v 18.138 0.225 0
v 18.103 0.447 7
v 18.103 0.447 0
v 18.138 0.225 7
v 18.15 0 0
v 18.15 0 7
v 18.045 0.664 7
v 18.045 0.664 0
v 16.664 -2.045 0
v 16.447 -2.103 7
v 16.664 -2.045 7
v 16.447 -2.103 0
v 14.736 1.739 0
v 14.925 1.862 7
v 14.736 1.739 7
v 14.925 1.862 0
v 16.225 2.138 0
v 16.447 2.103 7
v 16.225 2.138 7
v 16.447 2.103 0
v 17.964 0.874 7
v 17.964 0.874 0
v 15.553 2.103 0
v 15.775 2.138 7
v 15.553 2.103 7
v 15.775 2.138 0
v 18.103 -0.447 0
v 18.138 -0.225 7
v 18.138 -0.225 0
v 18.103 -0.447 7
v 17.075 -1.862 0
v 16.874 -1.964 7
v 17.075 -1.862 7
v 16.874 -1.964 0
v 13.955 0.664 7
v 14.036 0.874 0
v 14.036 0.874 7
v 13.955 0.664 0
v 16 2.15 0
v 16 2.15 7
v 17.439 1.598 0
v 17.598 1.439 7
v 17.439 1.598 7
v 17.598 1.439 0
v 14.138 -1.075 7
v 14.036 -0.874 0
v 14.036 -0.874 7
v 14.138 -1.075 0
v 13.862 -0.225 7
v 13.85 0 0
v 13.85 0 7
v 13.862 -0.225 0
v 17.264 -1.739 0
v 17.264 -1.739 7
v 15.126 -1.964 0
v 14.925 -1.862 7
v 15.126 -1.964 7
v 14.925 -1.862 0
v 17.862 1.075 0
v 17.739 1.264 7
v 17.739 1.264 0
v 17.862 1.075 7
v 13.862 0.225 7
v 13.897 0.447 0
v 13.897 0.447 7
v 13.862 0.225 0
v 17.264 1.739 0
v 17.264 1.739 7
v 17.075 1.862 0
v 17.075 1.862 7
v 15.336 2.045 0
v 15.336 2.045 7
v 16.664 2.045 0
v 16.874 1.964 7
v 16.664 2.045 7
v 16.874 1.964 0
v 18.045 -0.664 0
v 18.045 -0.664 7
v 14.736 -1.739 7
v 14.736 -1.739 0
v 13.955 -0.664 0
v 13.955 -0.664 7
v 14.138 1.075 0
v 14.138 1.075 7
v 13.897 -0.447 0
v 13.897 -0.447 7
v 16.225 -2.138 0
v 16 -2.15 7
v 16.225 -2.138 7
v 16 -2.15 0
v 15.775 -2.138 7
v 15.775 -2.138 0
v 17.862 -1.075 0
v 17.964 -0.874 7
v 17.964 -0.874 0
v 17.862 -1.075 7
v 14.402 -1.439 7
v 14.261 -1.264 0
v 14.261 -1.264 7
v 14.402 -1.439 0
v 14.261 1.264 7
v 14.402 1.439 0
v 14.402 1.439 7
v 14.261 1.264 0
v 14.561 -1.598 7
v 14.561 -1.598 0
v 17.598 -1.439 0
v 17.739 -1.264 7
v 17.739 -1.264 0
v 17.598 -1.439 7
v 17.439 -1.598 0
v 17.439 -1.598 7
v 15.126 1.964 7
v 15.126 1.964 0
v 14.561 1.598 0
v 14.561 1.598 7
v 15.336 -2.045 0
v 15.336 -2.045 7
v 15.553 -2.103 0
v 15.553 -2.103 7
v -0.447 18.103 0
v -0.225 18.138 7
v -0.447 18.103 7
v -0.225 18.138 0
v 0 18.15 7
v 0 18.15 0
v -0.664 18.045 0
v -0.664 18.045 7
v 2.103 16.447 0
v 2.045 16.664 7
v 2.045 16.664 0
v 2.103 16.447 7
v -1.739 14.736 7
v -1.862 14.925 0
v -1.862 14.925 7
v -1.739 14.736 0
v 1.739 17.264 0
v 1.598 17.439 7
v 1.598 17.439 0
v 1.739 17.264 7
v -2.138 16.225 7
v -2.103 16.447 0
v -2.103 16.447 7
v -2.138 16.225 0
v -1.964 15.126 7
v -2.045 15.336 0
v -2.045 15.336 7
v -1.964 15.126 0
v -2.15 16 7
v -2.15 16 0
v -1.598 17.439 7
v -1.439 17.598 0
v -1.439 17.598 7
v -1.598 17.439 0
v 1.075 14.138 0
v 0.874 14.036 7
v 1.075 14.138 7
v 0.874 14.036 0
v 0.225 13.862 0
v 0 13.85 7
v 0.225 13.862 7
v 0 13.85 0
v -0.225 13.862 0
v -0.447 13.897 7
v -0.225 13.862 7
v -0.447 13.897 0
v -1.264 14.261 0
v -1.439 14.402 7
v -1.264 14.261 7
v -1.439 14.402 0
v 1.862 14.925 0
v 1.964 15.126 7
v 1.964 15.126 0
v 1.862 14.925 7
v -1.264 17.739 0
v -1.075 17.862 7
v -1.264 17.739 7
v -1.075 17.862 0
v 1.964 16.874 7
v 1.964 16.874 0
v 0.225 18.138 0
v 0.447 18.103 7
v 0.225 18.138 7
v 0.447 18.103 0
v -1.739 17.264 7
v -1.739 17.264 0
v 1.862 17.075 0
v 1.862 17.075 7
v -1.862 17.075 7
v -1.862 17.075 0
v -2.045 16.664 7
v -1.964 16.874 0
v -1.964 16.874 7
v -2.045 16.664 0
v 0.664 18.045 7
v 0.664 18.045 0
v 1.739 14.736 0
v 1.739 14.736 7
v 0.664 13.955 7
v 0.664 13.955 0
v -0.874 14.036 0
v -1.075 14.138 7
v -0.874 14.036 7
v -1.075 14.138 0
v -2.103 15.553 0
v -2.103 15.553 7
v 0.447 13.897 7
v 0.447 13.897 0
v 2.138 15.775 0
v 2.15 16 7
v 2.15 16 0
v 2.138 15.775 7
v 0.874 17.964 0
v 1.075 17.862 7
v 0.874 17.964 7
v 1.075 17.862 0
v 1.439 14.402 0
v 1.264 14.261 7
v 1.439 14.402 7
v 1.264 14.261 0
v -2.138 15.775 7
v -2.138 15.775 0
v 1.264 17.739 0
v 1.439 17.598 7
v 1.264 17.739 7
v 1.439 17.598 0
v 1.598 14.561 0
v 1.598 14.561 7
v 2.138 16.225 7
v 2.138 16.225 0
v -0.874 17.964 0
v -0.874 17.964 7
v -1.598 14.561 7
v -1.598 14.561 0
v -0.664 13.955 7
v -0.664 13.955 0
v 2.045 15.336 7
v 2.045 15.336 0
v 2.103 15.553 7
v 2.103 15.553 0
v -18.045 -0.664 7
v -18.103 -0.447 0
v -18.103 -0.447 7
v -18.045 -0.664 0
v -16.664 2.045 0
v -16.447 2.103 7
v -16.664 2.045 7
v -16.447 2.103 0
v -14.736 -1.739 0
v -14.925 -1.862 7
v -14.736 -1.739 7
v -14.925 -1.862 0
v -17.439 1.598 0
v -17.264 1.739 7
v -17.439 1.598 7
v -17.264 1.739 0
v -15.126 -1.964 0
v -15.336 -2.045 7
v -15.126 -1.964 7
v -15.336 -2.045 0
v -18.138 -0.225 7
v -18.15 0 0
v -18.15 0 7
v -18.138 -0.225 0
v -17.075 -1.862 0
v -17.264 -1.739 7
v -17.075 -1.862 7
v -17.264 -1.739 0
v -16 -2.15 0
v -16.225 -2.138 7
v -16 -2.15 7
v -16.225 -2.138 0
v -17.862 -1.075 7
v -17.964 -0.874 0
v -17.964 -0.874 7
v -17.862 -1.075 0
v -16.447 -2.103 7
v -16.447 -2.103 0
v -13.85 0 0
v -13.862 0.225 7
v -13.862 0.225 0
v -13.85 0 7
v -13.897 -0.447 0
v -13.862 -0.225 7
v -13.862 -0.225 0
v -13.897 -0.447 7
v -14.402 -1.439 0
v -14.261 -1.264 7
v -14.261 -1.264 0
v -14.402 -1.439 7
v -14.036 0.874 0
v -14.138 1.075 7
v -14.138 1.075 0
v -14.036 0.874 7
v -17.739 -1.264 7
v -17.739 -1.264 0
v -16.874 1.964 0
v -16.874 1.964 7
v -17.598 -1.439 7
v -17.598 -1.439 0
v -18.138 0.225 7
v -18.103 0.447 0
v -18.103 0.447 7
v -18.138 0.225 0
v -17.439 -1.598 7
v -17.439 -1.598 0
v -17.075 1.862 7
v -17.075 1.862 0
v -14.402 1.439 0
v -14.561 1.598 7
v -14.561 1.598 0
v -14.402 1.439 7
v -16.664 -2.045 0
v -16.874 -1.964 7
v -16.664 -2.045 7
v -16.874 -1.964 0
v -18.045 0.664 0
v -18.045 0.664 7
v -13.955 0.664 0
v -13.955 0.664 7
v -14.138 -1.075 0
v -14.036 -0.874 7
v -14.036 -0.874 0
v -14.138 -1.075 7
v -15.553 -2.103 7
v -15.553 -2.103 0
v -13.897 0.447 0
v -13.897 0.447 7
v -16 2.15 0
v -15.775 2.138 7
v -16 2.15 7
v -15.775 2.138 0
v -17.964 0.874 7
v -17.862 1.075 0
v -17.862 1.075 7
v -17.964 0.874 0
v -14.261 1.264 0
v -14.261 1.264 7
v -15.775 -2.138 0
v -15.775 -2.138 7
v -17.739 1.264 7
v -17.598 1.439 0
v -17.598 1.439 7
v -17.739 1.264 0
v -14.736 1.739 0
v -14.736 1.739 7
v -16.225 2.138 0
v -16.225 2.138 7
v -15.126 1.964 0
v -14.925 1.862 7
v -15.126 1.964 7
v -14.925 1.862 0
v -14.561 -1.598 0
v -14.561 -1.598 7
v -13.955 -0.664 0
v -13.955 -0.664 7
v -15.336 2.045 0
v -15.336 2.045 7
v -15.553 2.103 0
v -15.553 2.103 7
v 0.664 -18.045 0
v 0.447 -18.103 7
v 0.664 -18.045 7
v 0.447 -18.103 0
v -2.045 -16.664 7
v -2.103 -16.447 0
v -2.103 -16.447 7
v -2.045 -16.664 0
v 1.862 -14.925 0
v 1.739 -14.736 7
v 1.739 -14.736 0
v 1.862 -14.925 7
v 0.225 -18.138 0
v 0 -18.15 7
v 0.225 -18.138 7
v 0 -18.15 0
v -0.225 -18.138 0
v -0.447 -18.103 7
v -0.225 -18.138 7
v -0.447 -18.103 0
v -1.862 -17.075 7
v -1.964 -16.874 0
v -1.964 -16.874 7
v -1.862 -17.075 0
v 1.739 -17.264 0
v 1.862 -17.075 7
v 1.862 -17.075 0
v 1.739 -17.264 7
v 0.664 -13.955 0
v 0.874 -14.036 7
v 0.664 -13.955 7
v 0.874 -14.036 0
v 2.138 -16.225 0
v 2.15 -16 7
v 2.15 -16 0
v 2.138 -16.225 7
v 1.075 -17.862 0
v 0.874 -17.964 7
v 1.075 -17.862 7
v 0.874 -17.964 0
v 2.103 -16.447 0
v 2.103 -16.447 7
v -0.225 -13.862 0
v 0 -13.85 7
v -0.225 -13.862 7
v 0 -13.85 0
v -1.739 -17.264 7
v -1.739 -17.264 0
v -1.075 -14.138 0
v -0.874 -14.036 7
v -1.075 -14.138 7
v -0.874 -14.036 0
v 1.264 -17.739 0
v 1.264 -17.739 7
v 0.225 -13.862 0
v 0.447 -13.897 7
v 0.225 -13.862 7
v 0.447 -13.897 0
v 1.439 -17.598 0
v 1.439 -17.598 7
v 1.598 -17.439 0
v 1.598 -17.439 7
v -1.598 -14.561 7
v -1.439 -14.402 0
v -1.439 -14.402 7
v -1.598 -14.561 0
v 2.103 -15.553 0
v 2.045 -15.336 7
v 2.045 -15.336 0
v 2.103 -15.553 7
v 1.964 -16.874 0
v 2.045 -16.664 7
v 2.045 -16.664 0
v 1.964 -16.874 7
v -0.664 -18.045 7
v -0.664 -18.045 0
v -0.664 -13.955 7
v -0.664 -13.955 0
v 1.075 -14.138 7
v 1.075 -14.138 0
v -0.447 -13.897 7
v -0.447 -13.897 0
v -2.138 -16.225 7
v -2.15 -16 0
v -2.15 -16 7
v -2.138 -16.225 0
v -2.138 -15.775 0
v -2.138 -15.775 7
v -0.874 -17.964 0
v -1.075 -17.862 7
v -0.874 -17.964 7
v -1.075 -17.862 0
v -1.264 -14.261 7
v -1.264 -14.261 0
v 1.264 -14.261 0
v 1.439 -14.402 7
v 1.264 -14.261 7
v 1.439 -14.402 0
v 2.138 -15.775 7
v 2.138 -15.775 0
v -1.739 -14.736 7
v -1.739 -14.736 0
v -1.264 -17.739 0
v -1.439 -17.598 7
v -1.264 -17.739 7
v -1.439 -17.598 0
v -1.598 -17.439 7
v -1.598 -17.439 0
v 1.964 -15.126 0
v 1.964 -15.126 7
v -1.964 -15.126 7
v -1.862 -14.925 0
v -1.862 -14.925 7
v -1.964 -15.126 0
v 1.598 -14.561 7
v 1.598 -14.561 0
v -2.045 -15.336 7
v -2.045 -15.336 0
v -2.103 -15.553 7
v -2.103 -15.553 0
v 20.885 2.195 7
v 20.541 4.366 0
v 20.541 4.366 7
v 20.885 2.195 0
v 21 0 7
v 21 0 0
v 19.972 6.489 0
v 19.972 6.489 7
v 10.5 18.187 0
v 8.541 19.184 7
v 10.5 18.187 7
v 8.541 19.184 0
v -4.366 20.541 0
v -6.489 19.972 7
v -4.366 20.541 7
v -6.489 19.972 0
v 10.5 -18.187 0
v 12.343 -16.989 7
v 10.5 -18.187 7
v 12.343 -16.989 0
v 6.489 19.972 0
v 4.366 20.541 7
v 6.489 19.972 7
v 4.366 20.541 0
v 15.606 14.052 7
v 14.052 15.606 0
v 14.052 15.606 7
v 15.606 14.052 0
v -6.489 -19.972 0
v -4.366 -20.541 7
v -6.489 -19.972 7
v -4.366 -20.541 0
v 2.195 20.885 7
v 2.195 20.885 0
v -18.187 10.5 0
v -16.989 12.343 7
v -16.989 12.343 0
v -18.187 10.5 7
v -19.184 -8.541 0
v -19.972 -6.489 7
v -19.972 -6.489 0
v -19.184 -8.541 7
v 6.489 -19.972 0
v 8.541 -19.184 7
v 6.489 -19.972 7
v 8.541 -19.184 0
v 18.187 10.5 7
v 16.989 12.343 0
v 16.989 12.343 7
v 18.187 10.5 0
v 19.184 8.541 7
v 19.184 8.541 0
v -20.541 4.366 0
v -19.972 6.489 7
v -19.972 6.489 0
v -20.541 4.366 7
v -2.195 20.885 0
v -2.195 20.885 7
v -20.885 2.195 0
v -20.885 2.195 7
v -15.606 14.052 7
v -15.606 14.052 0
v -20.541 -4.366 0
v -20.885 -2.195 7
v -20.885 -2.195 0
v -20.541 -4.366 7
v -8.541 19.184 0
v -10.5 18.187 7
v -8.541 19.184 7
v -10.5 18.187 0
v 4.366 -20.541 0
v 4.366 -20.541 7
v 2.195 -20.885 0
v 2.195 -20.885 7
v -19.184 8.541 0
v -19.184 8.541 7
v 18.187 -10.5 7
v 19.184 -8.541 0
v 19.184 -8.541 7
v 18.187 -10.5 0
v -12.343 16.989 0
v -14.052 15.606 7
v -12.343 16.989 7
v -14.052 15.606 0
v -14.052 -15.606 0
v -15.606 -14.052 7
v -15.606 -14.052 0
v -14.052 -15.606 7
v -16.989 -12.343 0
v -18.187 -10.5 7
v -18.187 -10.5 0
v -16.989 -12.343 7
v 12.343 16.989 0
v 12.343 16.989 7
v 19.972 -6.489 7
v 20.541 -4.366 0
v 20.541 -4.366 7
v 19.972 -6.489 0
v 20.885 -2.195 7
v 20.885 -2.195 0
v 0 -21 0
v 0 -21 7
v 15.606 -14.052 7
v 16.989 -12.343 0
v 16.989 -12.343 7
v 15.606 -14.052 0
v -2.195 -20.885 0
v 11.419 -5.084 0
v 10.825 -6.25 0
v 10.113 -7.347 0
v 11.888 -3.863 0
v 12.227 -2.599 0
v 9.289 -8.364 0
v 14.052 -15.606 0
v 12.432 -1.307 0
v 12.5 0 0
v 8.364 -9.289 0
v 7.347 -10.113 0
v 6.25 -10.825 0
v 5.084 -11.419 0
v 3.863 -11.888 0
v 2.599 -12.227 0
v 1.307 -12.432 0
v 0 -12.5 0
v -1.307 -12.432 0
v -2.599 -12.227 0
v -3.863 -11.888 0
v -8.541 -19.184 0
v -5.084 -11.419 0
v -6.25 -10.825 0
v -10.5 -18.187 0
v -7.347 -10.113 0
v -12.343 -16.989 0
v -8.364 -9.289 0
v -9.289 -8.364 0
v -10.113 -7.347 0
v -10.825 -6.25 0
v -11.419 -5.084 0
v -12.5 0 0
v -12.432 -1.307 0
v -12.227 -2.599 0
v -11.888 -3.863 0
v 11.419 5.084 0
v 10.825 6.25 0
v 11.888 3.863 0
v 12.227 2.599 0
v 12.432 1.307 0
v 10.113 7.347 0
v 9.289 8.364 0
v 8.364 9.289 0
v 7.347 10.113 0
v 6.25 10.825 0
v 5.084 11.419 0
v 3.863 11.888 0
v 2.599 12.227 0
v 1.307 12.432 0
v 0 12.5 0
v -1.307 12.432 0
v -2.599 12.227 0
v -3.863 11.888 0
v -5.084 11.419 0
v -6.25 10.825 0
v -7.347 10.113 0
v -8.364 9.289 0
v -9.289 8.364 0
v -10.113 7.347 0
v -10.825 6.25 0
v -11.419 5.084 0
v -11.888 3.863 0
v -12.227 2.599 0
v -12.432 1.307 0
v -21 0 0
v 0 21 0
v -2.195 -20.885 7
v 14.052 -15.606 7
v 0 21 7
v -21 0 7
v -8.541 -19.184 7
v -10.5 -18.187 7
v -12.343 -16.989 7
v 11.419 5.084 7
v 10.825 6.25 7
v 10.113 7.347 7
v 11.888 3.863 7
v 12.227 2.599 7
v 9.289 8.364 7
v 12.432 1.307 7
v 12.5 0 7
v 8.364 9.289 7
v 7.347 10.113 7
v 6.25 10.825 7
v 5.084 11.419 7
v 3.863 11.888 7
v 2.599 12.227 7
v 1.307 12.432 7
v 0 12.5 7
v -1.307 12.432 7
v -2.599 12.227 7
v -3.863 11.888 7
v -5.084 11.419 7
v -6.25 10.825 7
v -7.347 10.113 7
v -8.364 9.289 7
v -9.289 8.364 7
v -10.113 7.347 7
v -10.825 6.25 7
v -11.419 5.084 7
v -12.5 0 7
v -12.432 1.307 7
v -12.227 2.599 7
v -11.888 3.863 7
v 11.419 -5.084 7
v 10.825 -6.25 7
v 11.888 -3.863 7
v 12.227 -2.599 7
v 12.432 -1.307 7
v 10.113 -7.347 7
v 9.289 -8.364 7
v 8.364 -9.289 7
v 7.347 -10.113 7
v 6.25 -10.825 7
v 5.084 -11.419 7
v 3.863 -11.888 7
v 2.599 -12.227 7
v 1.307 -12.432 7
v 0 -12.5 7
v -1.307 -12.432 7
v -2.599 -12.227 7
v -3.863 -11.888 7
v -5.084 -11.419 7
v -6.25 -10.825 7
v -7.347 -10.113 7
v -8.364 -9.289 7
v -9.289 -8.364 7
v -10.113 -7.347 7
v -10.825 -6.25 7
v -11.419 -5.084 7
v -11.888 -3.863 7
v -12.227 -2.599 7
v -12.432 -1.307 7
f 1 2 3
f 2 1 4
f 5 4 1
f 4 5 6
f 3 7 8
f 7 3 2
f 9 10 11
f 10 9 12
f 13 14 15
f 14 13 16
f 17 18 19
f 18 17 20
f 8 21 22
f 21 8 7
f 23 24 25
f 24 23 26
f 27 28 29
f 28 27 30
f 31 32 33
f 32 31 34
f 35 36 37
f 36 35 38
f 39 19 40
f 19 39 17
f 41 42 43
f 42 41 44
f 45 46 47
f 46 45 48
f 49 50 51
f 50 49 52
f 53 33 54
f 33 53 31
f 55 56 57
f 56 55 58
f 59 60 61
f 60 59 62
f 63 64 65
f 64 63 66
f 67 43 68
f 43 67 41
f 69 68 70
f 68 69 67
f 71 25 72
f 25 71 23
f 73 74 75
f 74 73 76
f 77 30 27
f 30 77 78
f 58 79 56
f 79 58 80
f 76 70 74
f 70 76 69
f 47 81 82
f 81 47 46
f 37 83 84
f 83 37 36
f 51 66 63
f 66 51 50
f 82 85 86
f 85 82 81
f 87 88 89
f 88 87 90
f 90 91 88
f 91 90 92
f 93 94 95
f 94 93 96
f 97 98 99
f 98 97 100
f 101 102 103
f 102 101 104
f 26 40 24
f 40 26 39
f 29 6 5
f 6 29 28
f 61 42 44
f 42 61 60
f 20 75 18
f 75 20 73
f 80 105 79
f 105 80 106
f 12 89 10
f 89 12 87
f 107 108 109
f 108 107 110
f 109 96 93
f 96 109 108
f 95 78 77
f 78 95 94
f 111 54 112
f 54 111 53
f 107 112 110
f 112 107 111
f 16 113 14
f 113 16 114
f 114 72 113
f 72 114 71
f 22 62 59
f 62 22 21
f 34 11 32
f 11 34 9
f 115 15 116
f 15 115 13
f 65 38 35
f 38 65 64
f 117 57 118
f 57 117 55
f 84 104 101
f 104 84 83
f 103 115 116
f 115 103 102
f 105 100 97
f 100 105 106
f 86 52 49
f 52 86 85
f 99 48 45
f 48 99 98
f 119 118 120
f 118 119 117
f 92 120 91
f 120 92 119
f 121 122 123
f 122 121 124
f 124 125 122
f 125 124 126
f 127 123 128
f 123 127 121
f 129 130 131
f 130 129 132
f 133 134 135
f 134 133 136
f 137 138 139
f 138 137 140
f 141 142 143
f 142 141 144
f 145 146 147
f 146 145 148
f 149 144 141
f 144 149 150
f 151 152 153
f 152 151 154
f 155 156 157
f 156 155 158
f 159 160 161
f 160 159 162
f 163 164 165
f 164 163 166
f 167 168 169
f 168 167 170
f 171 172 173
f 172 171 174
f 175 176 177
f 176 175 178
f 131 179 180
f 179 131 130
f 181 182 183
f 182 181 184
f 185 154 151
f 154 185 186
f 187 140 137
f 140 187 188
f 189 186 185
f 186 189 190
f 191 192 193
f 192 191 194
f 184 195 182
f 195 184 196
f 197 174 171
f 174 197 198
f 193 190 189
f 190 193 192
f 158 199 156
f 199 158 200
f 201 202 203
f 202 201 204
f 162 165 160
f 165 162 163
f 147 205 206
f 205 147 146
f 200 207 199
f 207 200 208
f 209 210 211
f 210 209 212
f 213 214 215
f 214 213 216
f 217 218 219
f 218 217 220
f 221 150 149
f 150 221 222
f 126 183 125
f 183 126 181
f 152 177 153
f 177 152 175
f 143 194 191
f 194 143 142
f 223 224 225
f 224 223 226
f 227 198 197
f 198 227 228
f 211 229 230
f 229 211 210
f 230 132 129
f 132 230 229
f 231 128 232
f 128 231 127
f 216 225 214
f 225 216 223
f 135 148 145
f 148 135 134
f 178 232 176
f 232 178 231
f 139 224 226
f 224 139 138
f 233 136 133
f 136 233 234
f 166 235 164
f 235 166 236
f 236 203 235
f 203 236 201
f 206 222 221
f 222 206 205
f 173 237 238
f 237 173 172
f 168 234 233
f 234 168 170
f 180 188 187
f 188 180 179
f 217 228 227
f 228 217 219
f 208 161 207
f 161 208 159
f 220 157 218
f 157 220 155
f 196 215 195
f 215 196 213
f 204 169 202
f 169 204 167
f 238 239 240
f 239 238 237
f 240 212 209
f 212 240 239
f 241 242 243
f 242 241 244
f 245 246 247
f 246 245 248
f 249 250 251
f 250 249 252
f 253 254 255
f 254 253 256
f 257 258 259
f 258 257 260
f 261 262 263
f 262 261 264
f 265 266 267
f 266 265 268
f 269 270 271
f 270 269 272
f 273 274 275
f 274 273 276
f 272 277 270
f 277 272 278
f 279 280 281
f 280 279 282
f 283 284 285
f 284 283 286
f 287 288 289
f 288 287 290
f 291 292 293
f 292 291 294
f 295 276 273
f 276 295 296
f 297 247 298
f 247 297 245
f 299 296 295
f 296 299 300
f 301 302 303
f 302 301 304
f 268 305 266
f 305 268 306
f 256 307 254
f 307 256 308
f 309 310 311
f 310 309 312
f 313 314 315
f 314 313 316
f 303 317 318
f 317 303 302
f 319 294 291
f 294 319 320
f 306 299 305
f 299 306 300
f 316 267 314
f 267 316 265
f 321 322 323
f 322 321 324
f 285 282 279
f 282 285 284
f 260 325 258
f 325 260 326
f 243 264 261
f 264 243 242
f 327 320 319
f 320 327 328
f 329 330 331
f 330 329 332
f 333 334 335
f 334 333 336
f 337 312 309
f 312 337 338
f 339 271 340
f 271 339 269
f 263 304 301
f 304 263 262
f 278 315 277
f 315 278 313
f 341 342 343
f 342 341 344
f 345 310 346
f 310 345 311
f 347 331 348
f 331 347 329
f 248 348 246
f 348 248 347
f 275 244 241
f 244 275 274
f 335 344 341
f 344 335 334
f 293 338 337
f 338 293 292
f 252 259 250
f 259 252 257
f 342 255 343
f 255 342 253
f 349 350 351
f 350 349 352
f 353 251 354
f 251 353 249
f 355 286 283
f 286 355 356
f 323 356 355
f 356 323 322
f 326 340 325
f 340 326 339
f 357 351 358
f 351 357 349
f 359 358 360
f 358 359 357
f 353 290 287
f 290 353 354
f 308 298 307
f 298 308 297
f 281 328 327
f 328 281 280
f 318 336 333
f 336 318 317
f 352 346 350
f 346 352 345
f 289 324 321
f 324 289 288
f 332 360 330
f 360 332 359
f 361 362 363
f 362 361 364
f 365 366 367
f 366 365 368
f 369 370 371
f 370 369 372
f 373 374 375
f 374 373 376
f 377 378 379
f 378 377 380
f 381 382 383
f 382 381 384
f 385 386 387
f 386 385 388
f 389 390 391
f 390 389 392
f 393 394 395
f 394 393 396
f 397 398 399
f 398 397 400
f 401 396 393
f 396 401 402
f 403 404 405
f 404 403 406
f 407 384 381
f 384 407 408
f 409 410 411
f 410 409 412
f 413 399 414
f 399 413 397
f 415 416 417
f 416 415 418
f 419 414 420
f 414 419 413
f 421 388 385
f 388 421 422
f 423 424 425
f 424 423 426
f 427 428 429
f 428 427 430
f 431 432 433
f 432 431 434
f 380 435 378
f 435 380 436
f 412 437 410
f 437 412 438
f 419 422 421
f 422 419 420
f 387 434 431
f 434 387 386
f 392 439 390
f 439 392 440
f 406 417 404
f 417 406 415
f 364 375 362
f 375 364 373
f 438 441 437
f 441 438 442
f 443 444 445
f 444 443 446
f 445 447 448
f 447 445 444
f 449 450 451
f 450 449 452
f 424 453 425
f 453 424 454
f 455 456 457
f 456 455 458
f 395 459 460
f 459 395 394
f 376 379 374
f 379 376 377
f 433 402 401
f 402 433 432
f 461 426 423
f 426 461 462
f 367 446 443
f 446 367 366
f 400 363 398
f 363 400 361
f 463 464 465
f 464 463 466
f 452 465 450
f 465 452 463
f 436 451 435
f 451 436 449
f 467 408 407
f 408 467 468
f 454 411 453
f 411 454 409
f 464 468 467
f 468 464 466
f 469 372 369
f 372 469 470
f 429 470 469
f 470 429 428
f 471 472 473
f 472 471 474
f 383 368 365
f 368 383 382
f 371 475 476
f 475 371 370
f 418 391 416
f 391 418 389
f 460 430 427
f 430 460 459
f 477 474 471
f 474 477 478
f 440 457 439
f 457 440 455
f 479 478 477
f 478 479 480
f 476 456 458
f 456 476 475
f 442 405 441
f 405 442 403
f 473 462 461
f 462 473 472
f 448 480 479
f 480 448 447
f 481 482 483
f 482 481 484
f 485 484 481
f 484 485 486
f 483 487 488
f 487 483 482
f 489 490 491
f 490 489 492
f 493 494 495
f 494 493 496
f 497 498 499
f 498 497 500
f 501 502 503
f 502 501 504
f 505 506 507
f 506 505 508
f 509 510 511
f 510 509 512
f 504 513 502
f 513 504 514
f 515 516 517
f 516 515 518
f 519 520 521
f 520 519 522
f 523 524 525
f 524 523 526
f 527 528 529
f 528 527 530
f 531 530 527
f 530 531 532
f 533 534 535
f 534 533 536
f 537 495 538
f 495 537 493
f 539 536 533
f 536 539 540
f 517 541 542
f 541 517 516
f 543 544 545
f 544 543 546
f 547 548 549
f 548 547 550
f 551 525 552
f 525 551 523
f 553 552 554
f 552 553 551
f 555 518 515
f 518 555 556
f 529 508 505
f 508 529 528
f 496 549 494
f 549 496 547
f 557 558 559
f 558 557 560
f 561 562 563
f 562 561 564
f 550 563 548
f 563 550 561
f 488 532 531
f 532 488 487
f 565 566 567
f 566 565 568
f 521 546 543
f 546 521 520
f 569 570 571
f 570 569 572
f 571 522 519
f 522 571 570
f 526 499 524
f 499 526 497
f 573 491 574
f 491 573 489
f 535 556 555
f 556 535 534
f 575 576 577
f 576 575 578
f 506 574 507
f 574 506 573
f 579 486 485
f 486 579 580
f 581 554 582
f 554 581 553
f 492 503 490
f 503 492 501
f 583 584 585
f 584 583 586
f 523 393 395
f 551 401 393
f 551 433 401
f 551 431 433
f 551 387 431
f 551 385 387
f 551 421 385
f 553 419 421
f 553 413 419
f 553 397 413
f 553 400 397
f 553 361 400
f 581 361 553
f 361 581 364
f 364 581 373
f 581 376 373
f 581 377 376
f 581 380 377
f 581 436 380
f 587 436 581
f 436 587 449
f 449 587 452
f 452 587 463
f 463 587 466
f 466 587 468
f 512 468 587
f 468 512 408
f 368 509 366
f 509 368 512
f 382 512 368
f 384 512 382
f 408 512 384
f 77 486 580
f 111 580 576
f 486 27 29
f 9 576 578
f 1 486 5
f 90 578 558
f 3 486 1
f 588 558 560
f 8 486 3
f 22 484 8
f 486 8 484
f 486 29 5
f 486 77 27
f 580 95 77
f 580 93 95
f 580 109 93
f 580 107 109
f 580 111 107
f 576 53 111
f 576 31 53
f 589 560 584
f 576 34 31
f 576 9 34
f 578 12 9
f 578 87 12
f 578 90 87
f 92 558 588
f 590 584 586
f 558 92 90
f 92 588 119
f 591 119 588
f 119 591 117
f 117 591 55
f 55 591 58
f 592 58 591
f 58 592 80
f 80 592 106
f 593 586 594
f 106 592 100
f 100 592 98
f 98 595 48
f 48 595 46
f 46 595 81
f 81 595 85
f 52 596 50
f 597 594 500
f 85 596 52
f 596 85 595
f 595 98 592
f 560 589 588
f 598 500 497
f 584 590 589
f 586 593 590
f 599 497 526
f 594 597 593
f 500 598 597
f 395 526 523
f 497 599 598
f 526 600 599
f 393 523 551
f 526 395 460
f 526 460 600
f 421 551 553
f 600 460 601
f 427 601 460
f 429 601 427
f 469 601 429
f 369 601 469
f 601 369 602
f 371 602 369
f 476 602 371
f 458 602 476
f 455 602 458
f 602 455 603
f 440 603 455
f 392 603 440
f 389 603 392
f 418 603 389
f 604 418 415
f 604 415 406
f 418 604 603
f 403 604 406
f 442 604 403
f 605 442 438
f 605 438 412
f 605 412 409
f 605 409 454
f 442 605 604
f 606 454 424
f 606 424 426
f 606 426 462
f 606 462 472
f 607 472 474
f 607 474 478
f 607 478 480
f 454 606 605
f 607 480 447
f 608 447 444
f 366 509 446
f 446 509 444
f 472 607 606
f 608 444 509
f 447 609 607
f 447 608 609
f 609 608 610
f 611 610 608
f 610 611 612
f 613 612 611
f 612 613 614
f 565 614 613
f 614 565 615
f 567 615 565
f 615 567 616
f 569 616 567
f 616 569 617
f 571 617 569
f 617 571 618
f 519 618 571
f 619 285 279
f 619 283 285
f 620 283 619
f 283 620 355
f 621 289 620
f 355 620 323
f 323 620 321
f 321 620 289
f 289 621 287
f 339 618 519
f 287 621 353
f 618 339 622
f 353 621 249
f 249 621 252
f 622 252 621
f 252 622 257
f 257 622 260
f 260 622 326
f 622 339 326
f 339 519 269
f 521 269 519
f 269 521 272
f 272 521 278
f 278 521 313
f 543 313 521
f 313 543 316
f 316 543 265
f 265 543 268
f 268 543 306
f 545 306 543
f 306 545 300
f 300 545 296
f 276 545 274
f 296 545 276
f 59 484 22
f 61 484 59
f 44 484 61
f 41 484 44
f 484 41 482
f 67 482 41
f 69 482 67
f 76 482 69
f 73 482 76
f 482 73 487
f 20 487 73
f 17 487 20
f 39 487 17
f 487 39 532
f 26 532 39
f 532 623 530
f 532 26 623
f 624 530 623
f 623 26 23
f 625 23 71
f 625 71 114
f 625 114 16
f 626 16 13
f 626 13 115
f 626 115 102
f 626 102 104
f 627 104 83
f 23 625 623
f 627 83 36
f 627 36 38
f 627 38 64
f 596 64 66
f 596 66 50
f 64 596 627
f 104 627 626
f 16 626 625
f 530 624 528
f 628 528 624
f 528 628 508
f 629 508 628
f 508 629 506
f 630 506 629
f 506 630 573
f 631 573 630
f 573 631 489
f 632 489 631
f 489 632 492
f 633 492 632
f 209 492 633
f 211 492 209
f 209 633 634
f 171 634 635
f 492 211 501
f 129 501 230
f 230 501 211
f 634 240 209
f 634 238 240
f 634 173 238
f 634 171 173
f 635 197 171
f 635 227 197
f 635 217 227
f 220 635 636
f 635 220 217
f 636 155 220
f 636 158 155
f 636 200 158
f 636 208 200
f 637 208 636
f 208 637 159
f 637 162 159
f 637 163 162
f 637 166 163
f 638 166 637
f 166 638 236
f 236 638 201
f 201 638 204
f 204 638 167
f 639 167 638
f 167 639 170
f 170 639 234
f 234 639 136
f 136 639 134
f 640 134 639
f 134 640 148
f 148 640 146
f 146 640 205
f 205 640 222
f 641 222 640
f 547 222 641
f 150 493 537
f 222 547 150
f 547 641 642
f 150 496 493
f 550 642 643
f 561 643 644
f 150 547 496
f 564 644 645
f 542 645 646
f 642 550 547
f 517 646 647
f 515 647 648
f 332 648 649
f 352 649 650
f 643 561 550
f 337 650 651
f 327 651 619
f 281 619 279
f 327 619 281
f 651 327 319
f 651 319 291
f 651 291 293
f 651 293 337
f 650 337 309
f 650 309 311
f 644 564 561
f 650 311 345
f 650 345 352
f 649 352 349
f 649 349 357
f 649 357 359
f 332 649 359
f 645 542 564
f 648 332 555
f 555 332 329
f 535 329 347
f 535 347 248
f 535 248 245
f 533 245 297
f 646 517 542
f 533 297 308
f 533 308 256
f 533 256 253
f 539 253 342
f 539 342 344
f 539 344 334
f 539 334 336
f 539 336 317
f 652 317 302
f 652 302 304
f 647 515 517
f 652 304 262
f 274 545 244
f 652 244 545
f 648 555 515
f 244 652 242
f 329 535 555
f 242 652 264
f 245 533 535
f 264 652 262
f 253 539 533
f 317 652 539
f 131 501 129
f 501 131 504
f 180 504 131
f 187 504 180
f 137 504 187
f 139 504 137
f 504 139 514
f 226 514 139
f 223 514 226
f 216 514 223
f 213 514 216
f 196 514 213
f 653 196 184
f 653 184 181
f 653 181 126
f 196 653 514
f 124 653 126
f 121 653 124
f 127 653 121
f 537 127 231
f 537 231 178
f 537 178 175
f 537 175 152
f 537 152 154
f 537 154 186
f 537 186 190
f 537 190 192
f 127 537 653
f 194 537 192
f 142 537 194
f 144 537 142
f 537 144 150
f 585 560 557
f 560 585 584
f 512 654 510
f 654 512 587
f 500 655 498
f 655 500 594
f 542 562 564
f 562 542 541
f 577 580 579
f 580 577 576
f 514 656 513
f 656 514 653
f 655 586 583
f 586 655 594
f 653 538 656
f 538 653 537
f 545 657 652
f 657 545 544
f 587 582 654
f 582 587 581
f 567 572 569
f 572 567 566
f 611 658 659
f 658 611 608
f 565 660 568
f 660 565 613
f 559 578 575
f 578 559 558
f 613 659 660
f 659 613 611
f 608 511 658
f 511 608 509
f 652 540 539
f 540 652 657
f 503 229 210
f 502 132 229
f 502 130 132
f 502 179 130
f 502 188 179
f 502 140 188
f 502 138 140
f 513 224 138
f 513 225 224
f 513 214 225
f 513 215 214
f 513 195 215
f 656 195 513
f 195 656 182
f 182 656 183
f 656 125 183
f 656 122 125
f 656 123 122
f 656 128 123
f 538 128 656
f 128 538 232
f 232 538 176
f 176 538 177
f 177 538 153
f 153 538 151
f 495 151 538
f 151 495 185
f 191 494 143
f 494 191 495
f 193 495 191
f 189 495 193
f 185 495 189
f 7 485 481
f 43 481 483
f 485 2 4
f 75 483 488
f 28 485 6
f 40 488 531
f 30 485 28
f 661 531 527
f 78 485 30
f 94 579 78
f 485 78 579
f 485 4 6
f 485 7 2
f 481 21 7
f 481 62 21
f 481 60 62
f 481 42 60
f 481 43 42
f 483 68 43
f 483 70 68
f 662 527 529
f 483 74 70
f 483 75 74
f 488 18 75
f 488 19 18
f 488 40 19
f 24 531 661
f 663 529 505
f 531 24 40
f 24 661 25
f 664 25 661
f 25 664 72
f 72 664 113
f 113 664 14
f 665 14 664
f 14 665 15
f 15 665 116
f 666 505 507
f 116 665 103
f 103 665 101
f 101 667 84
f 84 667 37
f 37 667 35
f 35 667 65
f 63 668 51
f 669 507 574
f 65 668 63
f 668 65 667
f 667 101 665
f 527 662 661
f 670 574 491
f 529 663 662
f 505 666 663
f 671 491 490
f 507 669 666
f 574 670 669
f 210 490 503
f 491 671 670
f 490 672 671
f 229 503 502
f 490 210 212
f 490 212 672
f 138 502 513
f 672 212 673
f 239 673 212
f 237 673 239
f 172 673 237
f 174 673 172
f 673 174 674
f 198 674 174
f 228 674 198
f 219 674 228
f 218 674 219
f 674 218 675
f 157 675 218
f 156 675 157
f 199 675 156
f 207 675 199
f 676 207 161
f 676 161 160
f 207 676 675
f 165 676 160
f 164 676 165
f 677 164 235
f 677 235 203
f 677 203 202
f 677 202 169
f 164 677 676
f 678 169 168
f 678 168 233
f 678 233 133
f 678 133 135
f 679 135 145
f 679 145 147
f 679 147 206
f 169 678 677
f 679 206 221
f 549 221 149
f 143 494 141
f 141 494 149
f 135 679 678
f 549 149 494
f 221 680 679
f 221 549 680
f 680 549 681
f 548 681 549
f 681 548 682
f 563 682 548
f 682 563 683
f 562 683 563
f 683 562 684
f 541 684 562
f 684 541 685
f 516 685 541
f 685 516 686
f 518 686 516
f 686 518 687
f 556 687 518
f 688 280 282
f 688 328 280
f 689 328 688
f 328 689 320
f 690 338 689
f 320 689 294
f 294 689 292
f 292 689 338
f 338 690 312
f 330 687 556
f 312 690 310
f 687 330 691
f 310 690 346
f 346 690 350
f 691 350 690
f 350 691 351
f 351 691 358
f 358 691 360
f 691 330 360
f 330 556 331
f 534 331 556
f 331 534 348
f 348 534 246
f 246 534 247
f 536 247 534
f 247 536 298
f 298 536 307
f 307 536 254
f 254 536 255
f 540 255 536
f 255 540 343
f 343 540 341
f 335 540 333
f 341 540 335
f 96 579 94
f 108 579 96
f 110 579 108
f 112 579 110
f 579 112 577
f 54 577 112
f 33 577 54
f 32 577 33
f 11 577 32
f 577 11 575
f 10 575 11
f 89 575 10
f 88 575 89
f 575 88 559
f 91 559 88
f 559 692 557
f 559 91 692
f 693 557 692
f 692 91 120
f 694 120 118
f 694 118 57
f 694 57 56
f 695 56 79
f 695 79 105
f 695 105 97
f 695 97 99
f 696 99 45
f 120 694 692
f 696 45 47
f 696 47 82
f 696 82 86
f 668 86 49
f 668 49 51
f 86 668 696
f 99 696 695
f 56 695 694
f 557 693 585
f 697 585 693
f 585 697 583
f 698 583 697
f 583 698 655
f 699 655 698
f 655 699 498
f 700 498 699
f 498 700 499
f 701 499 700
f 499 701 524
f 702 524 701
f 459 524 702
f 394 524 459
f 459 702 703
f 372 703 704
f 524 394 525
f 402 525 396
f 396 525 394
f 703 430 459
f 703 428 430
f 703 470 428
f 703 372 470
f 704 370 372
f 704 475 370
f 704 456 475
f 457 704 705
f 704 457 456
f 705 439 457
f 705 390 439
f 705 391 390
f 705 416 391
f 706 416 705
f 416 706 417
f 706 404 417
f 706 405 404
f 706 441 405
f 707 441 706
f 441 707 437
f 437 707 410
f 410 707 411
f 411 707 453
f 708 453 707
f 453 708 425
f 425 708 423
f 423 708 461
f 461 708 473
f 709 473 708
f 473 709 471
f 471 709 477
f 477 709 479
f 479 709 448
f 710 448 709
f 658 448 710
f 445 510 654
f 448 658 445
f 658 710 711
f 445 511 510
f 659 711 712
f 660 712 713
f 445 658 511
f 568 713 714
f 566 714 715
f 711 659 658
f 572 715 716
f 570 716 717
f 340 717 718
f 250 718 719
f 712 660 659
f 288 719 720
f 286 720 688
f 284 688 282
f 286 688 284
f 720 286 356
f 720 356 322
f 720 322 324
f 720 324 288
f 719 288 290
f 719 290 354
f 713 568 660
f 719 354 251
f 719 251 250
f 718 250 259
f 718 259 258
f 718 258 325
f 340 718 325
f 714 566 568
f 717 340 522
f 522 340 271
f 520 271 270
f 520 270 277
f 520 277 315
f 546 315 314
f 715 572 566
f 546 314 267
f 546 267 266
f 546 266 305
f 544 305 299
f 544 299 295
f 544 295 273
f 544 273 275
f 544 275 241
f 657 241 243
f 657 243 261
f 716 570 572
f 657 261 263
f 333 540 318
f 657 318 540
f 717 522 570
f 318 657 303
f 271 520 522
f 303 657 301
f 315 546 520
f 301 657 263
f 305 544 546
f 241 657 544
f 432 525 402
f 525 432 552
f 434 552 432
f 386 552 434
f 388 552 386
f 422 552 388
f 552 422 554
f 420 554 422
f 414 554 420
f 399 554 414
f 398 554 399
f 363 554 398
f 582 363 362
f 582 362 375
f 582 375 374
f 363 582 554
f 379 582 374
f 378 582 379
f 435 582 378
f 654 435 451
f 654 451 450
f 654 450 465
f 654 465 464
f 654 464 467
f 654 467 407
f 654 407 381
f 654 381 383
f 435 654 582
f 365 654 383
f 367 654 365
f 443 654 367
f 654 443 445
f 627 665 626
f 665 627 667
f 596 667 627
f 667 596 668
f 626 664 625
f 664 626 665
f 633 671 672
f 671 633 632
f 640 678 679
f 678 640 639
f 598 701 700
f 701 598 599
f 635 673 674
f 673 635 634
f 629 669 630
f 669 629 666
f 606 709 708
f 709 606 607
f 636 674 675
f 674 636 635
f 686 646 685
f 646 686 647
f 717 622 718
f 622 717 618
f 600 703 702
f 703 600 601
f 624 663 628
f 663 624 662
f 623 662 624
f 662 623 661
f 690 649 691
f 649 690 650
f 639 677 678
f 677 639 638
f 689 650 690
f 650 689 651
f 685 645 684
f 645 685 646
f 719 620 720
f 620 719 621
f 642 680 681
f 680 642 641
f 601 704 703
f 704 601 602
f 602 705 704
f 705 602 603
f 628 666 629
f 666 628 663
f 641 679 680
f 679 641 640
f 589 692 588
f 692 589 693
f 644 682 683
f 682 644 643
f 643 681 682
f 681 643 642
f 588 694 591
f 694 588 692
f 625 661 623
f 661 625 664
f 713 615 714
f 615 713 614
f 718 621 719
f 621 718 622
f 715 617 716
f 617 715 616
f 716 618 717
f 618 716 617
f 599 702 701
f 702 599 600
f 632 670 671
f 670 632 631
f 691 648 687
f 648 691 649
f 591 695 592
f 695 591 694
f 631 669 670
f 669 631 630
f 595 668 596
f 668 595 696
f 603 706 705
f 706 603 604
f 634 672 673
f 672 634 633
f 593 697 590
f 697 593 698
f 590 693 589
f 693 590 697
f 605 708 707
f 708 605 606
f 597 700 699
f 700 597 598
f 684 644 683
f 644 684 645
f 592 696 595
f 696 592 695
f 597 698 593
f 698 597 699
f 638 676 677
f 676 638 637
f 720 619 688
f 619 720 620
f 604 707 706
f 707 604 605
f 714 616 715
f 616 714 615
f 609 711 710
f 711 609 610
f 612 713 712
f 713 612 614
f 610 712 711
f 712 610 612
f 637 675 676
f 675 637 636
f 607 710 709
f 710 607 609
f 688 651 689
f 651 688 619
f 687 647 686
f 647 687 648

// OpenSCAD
// Shaft-seal holder plate.
$fn = 60;
eps = 0.02;
seal_d = 25;
outer_d = 42;
plate_t = 7;
difference() { cylinder(d=outer_d,h=plate_t); translate([0,0,-eps]) cylinder(d=seal_d,h=plate_t+2*eps); for(i=[0:3]) rotate([0,0,i*90]) translate([outer_d/2-5,0,-eps]) cylinder(d=4.3,h=plate_t+2*eps); }
